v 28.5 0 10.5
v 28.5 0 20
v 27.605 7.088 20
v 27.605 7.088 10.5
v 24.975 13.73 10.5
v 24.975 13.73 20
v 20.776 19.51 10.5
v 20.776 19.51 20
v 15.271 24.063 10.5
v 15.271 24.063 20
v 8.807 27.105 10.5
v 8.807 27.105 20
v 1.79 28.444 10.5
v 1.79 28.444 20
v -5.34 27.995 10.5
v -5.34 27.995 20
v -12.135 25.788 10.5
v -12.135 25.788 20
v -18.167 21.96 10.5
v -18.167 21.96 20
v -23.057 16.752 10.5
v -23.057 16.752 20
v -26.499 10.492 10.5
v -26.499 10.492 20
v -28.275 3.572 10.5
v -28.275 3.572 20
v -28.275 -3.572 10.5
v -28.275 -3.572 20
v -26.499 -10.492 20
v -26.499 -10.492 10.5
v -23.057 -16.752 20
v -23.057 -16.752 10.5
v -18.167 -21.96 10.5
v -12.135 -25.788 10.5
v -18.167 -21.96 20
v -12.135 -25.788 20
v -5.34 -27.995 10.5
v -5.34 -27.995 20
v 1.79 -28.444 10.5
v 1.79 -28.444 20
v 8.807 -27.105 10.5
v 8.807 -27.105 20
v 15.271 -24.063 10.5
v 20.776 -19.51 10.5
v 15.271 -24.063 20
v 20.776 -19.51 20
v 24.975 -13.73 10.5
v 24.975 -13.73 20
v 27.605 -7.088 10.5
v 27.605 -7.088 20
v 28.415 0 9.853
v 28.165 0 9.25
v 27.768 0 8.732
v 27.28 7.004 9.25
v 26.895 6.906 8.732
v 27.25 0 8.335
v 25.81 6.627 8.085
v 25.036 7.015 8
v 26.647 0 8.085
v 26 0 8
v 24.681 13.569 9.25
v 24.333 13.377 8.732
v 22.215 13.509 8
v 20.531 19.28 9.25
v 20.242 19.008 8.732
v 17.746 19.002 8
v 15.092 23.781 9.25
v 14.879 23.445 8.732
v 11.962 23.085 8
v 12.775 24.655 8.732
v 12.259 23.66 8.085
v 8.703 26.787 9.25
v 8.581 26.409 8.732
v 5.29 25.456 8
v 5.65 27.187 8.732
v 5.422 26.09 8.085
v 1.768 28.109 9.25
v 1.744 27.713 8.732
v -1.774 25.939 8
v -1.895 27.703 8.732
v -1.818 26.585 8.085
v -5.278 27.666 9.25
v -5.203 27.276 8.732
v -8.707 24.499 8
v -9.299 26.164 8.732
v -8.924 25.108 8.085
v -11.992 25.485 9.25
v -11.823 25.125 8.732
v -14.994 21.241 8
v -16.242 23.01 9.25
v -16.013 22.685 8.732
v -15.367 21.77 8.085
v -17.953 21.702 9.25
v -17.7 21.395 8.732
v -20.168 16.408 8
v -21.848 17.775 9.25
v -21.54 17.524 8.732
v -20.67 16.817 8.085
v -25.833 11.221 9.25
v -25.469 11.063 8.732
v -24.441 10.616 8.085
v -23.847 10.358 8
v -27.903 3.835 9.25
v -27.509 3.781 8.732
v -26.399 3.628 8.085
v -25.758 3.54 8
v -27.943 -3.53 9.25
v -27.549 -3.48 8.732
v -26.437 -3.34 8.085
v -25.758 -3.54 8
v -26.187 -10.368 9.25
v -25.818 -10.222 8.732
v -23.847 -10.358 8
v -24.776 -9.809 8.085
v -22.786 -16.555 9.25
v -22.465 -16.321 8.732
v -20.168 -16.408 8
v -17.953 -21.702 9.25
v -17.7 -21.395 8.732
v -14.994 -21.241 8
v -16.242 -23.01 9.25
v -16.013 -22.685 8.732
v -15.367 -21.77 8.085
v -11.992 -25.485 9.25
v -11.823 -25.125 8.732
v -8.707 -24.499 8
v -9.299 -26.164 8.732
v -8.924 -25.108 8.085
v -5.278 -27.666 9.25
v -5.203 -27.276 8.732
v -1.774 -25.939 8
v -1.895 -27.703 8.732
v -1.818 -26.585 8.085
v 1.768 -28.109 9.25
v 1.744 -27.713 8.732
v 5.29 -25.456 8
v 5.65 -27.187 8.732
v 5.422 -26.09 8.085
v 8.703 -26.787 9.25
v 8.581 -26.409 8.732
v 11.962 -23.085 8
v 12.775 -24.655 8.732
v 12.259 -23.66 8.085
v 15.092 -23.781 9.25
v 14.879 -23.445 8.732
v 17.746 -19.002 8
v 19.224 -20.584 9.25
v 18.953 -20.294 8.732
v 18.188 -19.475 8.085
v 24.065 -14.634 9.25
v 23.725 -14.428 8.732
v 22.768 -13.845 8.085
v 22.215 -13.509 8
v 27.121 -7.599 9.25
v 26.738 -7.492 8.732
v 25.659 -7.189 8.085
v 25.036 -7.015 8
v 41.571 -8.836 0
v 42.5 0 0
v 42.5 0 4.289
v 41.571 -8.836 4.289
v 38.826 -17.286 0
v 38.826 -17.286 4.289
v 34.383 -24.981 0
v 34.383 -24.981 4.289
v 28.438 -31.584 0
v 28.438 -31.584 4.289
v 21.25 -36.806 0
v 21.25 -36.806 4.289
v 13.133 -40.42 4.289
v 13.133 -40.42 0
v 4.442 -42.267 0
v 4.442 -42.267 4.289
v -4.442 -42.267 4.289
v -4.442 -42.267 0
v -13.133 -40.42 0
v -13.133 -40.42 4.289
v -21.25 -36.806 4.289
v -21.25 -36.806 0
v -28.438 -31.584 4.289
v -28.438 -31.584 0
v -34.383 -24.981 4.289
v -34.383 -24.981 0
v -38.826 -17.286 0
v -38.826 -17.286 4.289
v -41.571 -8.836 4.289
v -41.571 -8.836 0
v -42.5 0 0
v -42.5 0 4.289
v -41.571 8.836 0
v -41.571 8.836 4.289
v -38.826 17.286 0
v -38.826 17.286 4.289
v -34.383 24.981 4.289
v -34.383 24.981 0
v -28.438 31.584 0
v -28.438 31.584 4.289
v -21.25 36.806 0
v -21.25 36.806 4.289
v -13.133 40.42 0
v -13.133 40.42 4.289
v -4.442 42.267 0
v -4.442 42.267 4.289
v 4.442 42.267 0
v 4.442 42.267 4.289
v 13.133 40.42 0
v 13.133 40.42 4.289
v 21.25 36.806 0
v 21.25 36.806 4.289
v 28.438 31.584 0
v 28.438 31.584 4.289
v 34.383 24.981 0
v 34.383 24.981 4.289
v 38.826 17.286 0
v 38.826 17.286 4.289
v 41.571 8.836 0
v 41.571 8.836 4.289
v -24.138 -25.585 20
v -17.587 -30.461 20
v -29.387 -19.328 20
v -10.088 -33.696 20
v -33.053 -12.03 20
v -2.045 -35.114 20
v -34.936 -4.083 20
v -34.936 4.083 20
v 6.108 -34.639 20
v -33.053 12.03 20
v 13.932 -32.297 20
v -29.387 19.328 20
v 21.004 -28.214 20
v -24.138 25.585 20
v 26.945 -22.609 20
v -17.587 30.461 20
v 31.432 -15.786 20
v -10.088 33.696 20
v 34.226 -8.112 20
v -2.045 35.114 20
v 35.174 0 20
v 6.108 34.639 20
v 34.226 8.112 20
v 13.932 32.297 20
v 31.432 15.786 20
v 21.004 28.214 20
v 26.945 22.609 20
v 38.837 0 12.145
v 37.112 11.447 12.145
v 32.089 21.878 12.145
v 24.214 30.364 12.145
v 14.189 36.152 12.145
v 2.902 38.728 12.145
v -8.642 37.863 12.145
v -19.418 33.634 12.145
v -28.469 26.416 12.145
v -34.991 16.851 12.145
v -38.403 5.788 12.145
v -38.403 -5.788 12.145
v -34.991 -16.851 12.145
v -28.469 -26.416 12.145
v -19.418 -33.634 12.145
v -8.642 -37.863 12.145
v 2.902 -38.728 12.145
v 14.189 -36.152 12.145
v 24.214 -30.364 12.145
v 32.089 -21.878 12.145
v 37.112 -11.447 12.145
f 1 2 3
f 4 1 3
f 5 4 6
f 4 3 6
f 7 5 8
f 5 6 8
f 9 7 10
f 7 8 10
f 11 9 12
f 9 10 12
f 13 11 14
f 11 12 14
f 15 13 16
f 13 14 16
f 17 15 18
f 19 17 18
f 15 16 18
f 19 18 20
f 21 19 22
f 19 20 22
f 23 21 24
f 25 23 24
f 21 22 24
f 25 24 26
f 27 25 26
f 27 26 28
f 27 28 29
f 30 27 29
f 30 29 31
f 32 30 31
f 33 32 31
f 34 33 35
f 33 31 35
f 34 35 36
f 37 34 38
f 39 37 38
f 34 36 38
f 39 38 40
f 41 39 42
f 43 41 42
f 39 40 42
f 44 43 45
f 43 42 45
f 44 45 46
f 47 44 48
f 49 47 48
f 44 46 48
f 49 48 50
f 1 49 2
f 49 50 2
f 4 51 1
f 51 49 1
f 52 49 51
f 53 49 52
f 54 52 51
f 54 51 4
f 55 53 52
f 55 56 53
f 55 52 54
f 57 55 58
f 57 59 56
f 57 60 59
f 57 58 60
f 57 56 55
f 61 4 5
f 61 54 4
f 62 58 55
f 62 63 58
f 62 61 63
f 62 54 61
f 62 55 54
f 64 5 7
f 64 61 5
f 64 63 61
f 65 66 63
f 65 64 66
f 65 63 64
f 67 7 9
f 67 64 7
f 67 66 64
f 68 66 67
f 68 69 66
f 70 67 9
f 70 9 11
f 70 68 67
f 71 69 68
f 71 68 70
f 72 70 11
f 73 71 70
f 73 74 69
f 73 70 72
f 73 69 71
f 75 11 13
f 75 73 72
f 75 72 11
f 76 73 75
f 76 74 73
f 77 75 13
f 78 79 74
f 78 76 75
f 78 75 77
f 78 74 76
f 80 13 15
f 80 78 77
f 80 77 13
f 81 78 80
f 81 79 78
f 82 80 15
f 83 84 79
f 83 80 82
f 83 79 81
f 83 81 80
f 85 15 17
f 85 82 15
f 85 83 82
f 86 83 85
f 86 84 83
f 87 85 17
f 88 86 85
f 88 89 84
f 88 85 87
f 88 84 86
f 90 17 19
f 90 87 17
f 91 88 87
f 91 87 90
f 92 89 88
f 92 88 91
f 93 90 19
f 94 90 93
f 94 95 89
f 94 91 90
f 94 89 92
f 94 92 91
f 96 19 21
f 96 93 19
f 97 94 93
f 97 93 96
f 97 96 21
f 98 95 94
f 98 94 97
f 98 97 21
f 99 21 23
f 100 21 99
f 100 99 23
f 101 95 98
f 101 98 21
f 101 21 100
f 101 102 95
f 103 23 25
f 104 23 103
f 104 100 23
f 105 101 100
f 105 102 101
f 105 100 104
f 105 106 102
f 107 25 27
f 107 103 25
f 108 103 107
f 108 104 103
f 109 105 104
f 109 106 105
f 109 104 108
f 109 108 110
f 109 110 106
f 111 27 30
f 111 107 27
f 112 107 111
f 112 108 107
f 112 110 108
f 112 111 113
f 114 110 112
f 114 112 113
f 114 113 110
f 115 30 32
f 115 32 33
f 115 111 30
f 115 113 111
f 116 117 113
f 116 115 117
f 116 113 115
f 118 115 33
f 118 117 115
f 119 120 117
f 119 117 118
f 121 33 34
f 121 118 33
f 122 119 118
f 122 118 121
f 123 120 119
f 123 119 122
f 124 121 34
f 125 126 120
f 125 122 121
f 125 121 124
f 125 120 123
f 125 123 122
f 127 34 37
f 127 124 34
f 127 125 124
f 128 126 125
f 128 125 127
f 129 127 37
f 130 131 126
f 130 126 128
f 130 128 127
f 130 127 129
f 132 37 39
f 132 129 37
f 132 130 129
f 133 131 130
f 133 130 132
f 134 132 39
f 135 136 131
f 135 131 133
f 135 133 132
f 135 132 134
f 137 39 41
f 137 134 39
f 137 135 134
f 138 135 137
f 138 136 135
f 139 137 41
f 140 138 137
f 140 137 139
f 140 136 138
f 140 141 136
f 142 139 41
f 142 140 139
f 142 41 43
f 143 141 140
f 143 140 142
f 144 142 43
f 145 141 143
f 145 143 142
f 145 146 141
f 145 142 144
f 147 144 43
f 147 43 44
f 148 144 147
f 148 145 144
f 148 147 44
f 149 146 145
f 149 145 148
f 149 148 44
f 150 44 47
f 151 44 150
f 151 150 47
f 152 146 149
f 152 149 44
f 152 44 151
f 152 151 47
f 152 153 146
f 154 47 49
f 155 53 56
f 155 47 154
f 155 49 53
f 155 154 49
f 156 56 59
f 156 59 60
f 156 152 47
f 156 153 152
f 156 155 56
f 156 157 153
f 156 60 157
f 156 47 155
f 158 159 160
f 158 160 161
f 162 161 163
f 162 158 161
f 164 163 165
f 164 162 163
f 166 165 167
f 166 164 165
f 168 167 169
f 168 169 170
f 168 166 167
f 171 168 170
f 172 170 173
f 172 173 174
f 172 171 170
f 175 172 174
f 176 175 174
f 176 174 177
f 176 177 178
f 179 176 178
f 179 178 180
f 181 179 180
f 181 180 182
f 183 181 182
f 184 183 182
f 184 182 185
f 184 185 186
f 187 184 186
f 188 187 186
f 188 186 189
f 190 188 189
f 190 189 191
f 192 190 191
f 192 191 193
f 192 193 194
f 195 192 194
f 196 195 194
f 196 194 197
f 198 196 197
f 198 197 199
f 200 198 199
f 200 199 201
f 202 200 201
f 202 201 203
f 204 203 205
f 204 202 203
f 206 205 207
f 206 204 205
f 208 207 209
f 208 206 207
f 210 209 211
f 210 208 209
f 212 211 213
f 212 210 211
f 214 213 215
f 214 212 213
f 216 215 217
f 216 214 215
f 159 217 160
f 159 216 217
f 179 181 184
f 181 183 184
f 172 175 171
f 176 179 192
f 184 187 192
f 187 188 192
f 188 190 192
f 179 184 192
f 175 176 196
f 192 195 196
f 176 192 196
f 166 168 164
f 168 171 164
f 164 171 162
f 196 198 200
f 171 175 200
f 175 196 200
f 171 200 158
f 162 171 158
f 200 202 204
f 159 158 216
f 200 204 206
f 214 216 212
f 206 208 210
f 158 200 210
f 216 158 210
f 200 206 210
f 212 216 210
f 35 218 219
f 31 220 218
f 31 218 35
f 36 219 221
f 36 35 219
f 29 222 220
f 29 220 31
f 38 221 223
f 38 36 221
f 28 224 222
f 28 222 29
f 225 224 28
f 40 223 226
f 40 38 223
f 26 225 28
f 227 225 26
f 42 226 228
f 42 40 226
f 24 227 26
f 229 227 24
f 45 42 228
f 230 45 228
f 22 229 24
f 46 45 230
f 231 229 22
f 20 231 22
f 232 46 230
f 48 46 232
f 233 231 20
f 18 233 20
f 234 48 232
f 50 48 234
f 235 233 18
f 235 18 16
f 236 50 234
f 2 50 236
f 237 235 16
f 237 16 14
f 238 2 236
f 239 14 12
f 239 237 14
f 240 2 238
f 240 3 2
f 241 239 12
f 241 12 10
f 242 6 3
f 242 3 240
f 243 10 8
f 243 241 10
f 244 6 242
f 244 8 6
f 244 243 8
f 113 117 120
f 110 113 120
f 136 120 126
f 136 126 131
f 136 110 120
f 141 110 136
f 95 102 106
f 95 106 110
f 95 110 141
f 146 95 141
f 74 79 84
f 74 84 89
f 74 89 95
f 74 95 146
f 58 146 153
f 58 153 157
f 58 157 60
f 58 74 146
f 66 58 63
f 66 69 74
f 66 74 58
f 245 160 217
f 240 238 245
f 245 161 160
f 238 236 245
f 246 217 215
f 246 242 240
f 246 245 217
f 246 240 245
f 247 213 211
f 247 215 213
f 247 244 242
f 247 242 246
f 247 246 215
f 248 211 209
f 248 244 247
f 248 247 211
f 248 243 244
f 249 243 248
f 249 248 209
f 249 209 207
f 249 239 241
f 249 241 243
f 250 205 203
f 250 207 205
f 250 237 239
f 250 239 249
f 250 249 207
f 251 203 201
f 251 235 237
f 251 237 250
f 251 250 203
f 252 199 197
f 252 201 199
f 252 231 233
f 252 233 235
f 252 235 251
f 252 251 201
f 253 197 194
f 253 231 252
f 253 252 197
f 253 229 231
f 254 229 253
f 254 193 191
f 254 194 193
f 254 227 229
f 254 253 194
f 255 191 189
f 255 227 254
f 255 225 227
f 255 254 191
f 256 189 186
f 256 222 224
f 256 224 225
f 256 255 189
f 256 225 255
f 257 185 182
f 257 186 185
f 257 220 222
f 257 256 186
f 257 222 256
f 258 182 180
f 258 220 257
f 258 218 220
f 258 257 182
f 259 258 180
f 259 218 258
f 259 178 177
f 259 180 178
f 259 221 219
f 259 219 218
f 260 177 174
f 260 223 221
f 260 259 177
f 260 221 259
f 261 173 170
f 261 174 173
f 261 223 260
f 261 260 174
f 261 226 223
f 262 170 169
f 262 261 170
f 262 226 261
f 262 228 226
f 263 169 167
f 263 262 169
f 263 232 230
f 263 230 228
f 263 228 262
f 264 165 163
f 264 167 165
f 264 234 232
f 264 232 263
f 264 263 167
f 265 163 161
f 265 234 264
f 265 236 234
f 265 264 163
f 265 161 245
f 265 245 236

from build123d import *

# Parameters (mm, degrees)
F0_R     = 44.5
F1_DEPTH = 20
F1_TAPER = 25
F2_R     = 28.5
F3_DEPTH = 12
F4_R     = 44.5
F4_R_2   = 42.5
F5_DEPTH = 20.001
F6_R     = 2.5


with BuildPart() as f1:
    # F0 (on Top) → F1 (new body)
    with BuildSketch(Plane.XY):
        Circle(F0_R)
    extrude(amount=F1_DEPTH, taper=F1_TAPER)

    # F2 (on face) → F3 (cut)
    with BuildSketch(Plane.XY.offset(20)):
        Circle(F2_R)
    extrude(amount=-F3_DEPTH, mode=Mode.SUBTRACT)

    # F4 (on face) → F5 (cut, through all)
    with BuildSketch(Plane(origin=(0, 0, 0), x_dir=(1, 0, 0), z_dir=(0, 0, -1))):
        Circle(F4_R)
        Circle(F4_R_2, mode=Mode.SUBTRACT)
    extrude(amount=-F5_DEPTH, mode=Mode.SUBTRACT)

    # F6
    f6_edges = [f1.edges().sort_by_distance(p)[0] for p in [
        (-28.5, 0, 8),
    ]]
    fillet(f6_edges, radius=F6_R)


solid = f1.part
